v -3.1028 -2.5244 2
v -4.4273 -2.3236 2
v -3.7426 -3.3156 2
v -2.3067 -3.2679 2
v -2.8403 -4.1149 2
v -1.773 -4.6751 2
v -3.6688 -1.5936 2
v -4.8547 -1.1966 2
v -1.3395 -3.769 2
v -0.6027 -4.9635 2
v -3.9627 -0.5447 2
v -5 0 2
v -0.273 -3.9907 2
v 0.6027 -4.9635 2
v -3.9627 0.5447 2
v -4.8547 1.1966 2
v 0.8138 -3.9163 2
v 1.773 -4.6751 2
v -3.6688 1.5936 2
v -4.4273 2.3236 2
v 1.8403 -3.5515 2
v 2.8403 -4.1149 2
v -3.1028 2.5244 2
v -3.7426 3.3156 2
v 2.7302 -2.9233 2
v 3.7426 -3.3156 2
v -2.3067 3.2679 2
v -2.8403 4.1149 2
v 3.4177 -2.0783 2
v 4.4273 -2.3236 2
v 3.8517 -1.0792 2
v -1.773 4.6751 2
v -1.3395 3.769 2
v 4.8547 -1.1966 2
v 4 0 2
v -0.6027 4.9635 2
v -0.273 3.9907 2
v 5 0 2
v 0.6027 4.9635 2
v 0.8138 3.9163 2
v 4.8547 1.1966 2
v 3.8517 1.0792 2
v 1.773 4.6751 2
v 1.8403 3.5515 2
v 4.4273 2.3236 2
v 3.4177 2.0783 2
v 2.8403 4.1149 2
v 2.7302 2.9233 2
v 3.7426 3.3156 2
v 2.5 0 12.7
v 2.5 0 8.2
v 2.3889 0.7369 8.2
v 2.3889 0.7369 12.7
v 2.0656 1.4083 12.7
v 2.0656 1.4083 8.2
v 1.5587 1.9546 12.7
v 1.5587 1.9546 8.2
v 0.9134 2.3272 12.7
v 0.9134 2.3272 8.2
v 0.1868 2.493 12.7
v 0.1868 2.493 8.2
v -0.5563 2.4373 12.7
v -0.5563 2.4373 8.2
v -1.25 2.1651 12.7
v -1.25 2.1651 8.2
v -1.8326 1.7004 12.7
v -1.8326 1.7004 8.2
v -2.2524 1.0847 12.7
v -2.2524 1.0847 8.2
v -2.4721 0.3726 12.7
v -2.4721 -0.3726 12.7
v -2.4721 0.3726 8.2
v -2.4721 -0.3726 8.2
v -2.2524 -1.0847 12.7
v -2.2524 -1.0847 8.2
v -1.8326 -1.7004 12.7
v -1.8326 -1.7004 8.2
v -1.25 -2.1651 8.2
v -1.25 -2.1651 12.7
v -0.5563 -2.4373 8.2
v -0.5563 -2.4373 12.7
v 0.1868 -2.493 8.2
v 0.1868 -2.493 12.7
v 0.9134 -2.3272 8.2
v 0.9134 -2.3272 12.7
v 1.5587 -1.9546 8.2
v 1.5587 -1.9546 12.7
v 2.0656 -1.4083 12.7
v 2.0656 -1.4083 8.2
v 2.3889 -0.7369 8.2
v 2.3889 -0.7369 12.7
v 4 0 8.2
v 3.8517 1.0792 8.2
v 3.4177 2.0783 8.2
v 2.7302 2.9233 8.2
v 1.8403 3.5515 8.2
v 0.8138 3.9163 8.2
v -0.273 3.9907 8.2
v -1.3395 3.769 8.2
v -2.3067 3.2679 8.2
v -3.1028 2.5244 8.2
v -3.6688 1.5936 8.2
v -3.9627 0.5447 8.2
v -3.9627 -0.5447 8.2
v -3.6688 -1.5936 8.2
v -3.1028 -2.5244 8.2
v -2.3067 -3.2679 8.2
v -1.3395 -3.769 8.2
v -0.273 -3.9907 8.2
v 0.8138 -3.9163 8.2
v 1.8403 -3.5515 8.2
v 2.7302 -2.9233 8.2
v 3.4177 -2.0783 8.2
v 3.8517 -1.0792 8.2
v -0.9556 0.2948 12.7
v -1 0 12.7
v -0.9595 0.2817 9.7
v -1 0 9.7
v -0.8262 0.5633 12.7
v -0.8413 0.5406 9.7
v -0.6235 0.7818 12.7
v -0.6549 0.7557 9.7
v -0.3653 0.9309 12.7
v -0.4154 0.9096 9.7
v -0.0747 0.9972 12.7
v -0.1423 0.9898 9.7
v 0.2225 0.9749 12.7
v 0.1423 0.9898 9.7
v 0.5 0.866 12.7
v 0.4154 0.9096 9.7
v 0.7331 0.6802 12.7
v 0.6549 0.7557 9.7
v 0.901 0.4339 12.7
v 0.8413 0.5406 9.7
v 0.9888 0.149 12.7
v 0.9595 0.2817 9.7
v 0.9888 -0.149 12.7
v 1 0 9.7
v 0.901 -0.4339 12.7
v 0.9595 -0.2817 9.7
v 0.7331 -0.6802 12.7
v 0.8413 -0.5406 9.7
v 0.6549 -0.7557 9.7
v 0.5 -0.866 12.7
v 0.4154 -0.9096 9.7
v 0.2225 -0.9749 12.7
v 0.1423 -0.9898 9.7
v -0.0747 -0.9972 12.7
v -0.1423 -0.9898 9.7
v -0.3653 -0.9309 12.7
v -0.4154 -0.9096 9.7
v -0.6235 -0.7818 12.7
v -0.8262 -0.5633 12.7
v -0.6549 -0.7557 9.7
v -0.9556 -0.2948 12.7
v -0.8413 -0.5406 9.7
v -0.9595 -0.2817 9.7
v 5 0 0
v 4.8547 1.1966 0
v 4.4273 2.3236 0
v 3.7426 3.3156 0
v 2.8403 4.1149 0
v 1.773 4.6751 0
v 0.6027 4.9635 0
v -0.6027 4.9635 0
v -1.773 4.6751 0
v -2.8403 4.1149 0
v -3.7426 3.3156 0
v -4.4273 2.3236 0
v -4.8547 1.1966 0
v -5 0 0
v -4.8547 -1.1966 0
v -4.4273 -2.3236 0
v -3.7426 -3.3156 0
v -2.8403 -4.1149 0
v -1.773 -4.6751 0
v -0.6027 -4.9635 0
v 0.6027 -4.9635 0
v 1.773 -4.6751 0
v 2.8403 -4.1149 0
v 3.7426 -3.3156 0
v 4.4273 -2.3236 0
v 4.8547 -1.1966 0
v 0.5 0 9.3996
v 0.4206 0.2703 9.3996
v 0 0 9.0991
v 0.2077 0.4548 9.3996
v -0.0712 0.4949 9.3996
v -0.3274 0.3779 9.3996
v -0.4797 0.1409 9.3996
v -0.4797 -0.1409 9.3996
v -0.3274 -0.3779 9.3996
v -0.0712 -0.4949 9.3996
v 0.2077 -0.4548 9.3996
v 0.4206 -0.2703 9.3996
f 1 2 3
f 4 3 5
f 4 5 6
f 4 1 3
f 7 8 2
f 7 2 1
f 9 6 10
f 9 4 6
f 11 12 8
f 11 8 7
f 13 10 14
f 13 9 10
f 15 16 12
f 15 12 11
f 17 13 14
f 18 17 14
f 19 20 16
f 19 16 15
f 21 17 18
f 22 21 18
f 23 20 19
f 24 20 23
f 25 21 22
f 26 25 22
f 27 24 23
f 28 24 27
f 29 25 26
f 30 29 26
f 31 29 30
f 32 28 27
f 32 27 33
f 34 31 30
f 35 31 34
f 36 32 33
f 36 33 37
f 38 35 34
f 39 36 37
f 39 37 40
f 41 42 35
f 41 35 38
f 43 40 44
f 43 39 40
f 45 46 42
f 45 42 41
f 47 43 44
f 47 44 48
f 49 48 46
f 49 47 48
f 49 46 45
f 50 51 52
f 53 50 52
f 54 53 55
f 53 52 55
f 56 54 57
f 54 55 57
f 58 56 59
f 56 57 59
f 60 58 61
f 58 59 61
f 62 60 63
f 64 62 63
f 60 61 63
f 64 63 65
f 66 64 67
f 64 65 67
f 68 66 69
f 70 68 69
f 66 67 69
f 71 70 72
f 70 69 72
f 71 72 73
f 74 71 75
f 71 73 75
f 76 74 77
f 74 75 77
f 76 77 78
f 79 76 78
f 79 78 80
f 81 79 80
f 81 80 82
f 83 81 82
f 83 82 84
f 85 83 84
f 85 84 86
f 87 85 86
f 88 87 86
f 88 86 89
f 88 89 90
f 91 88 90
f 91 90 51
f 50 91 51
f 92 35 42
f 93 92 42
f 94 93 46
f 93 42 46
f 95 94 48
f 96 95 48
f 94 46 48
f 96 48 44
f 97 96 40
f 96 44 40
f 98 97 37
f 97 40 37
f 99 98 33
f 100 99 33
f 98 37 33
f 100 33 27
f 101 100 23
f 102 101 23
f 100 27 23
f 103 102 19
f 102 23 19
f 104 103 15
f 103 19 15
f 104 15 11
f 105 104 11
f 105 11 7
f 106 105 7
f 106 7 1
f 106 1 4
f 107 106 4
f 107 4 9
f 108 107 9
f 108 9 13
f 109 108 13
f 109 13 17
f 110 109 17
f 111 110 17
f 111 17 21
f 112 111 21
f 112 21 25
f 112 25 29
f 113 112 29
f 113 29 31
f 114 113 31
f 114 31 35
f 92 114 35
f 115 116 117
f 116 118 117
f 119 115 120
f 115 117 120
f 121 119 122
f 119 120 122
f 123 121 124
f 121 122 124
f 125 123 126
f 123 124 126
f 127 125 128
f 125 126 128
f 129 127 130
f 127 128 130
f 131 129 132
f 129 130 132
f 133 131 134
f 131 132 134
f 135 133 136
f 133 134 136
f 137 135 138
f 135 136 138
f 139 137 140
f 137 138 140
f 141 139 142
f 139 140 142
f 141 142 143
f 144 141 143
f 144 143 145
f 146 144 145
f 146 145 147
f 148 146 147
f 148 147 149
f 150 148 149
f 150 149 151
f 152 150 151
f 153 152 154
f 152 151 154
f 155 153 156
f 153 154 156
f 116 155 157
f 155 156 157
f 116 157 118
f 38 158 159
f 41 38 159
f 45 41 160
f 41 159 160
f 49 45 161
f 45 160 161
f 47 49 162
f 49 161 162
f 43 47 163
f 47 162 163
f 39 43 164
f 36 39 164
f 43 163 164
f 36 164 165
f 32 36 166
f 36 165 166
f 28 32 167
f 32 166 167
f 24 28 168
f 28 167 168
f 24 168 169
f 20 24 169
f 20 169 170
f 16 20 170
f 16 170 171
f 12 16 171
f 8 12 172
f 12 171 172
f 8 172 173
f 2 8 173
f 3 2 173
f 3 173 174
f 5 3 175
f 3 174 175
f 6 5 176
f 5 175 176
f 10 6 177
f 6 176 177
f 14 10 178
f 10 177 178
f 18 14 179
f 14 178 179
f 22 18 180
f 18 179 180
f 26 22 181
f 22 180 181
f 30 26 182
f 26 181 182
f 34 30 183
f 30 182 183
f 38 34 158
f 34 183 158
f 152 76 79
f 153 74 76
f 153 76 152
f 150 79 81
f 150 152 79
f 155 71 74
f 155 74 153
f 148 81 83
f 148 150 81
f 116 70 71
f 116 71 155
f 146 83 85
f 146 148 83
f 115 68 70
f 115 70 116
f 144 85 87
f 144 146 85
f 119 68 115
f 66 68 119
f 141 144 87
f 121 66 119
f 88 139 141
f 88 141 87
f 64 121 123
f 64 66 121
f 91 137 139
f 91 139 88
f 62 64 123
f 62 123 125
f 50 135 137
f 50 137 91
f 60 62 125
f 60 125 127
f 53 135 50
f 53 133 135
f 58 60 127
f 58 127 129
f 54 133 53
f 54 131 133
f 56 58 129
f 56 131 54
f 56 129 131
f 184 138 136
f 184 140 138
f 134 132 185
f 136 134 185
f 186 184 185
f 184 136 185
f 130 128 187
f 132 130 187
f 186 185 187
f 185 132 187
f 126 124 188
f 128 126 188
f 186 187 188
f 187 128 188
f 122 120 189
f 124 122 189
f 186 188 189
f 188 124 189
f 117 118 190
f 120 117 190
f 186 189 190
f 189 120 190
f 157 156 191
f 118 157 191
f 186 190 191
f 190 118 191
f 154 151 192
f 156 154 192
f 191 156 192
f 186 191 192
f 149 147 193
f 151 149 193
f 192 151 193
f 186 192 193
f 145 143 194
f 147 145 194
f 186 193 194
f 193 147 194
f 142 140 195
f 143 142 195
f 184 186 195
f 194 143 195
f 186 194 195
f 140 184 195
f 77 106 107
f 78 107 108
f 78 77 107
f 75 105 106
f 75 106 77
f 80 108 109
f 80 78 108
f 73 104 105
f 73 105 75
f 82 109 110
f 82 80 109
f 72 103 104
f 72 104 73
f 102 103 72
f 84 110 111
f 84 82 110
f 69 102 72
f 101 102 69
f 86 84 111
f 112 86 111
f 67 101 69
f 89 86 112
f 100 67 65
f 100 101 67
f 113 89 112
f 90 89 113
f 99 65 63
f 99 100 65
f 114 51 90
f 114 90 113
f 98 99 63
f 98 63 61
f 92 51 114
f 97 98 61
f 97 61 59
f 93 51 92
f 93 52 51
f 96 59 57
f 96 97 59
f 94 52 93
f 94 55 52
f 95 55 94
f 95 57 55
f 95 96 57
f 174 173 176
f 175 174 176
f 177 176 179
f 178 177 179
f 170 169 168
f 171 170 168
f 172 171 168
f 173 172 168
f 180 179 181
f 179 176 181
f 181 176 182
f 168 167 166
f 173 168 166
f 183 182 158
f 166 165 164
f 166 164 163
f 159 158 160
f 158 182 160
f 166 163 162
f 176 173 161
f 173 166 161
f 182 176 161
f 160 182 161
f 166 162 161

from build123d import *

# Parameters (mm, degrees)
F0_R     = 2.5
F1_DEPTH = 12.7
F0_R_2   = 4
F2_DEPTH = 8.2
F0_R_3   = 5
F3_DEPTH = 2
F5_D     = 2
F5_DEPTH = 3
F5_TIP   = 0.600860619


with BuildPart() as f1:
    # F0 (on Top) → F1 (new body)
    with BuildSketch(Plane.XY):
        Circle(F0_R)
    extrude(amount=F1_DEPTH)

    # F0 (on Top) → F2 (join)
    with BuildSketch(Plane.XY):
        Circle(F0_R_2)
        Circle(F0_R, mode=Mode.SUBTRACT)
    extrude(amount=F2_DEPTH)

    # F0 (on Top) → F3 (join)
    with BuildSketch(Plane.XY):
        Circle(F0_R_3)
        Circle(F0_R_2, mode=Mode.SUBTRACT)
    extrude(amount=F3_DEPTH)

    # F5
    with Locations(Plane.XY.offset(12.7)):
        with Locations((0, 0)):
            Hole(F5_D / 2, depth=F5_DEPTH)
            with Locations((0, 0, -(F5_DEPTH + F5_TIP / 2))):  # 118° drill point
                Cone(0, F5_D / 2, F5_TIP, mode=Mode.SUBTRACT)


solid = f1.part
